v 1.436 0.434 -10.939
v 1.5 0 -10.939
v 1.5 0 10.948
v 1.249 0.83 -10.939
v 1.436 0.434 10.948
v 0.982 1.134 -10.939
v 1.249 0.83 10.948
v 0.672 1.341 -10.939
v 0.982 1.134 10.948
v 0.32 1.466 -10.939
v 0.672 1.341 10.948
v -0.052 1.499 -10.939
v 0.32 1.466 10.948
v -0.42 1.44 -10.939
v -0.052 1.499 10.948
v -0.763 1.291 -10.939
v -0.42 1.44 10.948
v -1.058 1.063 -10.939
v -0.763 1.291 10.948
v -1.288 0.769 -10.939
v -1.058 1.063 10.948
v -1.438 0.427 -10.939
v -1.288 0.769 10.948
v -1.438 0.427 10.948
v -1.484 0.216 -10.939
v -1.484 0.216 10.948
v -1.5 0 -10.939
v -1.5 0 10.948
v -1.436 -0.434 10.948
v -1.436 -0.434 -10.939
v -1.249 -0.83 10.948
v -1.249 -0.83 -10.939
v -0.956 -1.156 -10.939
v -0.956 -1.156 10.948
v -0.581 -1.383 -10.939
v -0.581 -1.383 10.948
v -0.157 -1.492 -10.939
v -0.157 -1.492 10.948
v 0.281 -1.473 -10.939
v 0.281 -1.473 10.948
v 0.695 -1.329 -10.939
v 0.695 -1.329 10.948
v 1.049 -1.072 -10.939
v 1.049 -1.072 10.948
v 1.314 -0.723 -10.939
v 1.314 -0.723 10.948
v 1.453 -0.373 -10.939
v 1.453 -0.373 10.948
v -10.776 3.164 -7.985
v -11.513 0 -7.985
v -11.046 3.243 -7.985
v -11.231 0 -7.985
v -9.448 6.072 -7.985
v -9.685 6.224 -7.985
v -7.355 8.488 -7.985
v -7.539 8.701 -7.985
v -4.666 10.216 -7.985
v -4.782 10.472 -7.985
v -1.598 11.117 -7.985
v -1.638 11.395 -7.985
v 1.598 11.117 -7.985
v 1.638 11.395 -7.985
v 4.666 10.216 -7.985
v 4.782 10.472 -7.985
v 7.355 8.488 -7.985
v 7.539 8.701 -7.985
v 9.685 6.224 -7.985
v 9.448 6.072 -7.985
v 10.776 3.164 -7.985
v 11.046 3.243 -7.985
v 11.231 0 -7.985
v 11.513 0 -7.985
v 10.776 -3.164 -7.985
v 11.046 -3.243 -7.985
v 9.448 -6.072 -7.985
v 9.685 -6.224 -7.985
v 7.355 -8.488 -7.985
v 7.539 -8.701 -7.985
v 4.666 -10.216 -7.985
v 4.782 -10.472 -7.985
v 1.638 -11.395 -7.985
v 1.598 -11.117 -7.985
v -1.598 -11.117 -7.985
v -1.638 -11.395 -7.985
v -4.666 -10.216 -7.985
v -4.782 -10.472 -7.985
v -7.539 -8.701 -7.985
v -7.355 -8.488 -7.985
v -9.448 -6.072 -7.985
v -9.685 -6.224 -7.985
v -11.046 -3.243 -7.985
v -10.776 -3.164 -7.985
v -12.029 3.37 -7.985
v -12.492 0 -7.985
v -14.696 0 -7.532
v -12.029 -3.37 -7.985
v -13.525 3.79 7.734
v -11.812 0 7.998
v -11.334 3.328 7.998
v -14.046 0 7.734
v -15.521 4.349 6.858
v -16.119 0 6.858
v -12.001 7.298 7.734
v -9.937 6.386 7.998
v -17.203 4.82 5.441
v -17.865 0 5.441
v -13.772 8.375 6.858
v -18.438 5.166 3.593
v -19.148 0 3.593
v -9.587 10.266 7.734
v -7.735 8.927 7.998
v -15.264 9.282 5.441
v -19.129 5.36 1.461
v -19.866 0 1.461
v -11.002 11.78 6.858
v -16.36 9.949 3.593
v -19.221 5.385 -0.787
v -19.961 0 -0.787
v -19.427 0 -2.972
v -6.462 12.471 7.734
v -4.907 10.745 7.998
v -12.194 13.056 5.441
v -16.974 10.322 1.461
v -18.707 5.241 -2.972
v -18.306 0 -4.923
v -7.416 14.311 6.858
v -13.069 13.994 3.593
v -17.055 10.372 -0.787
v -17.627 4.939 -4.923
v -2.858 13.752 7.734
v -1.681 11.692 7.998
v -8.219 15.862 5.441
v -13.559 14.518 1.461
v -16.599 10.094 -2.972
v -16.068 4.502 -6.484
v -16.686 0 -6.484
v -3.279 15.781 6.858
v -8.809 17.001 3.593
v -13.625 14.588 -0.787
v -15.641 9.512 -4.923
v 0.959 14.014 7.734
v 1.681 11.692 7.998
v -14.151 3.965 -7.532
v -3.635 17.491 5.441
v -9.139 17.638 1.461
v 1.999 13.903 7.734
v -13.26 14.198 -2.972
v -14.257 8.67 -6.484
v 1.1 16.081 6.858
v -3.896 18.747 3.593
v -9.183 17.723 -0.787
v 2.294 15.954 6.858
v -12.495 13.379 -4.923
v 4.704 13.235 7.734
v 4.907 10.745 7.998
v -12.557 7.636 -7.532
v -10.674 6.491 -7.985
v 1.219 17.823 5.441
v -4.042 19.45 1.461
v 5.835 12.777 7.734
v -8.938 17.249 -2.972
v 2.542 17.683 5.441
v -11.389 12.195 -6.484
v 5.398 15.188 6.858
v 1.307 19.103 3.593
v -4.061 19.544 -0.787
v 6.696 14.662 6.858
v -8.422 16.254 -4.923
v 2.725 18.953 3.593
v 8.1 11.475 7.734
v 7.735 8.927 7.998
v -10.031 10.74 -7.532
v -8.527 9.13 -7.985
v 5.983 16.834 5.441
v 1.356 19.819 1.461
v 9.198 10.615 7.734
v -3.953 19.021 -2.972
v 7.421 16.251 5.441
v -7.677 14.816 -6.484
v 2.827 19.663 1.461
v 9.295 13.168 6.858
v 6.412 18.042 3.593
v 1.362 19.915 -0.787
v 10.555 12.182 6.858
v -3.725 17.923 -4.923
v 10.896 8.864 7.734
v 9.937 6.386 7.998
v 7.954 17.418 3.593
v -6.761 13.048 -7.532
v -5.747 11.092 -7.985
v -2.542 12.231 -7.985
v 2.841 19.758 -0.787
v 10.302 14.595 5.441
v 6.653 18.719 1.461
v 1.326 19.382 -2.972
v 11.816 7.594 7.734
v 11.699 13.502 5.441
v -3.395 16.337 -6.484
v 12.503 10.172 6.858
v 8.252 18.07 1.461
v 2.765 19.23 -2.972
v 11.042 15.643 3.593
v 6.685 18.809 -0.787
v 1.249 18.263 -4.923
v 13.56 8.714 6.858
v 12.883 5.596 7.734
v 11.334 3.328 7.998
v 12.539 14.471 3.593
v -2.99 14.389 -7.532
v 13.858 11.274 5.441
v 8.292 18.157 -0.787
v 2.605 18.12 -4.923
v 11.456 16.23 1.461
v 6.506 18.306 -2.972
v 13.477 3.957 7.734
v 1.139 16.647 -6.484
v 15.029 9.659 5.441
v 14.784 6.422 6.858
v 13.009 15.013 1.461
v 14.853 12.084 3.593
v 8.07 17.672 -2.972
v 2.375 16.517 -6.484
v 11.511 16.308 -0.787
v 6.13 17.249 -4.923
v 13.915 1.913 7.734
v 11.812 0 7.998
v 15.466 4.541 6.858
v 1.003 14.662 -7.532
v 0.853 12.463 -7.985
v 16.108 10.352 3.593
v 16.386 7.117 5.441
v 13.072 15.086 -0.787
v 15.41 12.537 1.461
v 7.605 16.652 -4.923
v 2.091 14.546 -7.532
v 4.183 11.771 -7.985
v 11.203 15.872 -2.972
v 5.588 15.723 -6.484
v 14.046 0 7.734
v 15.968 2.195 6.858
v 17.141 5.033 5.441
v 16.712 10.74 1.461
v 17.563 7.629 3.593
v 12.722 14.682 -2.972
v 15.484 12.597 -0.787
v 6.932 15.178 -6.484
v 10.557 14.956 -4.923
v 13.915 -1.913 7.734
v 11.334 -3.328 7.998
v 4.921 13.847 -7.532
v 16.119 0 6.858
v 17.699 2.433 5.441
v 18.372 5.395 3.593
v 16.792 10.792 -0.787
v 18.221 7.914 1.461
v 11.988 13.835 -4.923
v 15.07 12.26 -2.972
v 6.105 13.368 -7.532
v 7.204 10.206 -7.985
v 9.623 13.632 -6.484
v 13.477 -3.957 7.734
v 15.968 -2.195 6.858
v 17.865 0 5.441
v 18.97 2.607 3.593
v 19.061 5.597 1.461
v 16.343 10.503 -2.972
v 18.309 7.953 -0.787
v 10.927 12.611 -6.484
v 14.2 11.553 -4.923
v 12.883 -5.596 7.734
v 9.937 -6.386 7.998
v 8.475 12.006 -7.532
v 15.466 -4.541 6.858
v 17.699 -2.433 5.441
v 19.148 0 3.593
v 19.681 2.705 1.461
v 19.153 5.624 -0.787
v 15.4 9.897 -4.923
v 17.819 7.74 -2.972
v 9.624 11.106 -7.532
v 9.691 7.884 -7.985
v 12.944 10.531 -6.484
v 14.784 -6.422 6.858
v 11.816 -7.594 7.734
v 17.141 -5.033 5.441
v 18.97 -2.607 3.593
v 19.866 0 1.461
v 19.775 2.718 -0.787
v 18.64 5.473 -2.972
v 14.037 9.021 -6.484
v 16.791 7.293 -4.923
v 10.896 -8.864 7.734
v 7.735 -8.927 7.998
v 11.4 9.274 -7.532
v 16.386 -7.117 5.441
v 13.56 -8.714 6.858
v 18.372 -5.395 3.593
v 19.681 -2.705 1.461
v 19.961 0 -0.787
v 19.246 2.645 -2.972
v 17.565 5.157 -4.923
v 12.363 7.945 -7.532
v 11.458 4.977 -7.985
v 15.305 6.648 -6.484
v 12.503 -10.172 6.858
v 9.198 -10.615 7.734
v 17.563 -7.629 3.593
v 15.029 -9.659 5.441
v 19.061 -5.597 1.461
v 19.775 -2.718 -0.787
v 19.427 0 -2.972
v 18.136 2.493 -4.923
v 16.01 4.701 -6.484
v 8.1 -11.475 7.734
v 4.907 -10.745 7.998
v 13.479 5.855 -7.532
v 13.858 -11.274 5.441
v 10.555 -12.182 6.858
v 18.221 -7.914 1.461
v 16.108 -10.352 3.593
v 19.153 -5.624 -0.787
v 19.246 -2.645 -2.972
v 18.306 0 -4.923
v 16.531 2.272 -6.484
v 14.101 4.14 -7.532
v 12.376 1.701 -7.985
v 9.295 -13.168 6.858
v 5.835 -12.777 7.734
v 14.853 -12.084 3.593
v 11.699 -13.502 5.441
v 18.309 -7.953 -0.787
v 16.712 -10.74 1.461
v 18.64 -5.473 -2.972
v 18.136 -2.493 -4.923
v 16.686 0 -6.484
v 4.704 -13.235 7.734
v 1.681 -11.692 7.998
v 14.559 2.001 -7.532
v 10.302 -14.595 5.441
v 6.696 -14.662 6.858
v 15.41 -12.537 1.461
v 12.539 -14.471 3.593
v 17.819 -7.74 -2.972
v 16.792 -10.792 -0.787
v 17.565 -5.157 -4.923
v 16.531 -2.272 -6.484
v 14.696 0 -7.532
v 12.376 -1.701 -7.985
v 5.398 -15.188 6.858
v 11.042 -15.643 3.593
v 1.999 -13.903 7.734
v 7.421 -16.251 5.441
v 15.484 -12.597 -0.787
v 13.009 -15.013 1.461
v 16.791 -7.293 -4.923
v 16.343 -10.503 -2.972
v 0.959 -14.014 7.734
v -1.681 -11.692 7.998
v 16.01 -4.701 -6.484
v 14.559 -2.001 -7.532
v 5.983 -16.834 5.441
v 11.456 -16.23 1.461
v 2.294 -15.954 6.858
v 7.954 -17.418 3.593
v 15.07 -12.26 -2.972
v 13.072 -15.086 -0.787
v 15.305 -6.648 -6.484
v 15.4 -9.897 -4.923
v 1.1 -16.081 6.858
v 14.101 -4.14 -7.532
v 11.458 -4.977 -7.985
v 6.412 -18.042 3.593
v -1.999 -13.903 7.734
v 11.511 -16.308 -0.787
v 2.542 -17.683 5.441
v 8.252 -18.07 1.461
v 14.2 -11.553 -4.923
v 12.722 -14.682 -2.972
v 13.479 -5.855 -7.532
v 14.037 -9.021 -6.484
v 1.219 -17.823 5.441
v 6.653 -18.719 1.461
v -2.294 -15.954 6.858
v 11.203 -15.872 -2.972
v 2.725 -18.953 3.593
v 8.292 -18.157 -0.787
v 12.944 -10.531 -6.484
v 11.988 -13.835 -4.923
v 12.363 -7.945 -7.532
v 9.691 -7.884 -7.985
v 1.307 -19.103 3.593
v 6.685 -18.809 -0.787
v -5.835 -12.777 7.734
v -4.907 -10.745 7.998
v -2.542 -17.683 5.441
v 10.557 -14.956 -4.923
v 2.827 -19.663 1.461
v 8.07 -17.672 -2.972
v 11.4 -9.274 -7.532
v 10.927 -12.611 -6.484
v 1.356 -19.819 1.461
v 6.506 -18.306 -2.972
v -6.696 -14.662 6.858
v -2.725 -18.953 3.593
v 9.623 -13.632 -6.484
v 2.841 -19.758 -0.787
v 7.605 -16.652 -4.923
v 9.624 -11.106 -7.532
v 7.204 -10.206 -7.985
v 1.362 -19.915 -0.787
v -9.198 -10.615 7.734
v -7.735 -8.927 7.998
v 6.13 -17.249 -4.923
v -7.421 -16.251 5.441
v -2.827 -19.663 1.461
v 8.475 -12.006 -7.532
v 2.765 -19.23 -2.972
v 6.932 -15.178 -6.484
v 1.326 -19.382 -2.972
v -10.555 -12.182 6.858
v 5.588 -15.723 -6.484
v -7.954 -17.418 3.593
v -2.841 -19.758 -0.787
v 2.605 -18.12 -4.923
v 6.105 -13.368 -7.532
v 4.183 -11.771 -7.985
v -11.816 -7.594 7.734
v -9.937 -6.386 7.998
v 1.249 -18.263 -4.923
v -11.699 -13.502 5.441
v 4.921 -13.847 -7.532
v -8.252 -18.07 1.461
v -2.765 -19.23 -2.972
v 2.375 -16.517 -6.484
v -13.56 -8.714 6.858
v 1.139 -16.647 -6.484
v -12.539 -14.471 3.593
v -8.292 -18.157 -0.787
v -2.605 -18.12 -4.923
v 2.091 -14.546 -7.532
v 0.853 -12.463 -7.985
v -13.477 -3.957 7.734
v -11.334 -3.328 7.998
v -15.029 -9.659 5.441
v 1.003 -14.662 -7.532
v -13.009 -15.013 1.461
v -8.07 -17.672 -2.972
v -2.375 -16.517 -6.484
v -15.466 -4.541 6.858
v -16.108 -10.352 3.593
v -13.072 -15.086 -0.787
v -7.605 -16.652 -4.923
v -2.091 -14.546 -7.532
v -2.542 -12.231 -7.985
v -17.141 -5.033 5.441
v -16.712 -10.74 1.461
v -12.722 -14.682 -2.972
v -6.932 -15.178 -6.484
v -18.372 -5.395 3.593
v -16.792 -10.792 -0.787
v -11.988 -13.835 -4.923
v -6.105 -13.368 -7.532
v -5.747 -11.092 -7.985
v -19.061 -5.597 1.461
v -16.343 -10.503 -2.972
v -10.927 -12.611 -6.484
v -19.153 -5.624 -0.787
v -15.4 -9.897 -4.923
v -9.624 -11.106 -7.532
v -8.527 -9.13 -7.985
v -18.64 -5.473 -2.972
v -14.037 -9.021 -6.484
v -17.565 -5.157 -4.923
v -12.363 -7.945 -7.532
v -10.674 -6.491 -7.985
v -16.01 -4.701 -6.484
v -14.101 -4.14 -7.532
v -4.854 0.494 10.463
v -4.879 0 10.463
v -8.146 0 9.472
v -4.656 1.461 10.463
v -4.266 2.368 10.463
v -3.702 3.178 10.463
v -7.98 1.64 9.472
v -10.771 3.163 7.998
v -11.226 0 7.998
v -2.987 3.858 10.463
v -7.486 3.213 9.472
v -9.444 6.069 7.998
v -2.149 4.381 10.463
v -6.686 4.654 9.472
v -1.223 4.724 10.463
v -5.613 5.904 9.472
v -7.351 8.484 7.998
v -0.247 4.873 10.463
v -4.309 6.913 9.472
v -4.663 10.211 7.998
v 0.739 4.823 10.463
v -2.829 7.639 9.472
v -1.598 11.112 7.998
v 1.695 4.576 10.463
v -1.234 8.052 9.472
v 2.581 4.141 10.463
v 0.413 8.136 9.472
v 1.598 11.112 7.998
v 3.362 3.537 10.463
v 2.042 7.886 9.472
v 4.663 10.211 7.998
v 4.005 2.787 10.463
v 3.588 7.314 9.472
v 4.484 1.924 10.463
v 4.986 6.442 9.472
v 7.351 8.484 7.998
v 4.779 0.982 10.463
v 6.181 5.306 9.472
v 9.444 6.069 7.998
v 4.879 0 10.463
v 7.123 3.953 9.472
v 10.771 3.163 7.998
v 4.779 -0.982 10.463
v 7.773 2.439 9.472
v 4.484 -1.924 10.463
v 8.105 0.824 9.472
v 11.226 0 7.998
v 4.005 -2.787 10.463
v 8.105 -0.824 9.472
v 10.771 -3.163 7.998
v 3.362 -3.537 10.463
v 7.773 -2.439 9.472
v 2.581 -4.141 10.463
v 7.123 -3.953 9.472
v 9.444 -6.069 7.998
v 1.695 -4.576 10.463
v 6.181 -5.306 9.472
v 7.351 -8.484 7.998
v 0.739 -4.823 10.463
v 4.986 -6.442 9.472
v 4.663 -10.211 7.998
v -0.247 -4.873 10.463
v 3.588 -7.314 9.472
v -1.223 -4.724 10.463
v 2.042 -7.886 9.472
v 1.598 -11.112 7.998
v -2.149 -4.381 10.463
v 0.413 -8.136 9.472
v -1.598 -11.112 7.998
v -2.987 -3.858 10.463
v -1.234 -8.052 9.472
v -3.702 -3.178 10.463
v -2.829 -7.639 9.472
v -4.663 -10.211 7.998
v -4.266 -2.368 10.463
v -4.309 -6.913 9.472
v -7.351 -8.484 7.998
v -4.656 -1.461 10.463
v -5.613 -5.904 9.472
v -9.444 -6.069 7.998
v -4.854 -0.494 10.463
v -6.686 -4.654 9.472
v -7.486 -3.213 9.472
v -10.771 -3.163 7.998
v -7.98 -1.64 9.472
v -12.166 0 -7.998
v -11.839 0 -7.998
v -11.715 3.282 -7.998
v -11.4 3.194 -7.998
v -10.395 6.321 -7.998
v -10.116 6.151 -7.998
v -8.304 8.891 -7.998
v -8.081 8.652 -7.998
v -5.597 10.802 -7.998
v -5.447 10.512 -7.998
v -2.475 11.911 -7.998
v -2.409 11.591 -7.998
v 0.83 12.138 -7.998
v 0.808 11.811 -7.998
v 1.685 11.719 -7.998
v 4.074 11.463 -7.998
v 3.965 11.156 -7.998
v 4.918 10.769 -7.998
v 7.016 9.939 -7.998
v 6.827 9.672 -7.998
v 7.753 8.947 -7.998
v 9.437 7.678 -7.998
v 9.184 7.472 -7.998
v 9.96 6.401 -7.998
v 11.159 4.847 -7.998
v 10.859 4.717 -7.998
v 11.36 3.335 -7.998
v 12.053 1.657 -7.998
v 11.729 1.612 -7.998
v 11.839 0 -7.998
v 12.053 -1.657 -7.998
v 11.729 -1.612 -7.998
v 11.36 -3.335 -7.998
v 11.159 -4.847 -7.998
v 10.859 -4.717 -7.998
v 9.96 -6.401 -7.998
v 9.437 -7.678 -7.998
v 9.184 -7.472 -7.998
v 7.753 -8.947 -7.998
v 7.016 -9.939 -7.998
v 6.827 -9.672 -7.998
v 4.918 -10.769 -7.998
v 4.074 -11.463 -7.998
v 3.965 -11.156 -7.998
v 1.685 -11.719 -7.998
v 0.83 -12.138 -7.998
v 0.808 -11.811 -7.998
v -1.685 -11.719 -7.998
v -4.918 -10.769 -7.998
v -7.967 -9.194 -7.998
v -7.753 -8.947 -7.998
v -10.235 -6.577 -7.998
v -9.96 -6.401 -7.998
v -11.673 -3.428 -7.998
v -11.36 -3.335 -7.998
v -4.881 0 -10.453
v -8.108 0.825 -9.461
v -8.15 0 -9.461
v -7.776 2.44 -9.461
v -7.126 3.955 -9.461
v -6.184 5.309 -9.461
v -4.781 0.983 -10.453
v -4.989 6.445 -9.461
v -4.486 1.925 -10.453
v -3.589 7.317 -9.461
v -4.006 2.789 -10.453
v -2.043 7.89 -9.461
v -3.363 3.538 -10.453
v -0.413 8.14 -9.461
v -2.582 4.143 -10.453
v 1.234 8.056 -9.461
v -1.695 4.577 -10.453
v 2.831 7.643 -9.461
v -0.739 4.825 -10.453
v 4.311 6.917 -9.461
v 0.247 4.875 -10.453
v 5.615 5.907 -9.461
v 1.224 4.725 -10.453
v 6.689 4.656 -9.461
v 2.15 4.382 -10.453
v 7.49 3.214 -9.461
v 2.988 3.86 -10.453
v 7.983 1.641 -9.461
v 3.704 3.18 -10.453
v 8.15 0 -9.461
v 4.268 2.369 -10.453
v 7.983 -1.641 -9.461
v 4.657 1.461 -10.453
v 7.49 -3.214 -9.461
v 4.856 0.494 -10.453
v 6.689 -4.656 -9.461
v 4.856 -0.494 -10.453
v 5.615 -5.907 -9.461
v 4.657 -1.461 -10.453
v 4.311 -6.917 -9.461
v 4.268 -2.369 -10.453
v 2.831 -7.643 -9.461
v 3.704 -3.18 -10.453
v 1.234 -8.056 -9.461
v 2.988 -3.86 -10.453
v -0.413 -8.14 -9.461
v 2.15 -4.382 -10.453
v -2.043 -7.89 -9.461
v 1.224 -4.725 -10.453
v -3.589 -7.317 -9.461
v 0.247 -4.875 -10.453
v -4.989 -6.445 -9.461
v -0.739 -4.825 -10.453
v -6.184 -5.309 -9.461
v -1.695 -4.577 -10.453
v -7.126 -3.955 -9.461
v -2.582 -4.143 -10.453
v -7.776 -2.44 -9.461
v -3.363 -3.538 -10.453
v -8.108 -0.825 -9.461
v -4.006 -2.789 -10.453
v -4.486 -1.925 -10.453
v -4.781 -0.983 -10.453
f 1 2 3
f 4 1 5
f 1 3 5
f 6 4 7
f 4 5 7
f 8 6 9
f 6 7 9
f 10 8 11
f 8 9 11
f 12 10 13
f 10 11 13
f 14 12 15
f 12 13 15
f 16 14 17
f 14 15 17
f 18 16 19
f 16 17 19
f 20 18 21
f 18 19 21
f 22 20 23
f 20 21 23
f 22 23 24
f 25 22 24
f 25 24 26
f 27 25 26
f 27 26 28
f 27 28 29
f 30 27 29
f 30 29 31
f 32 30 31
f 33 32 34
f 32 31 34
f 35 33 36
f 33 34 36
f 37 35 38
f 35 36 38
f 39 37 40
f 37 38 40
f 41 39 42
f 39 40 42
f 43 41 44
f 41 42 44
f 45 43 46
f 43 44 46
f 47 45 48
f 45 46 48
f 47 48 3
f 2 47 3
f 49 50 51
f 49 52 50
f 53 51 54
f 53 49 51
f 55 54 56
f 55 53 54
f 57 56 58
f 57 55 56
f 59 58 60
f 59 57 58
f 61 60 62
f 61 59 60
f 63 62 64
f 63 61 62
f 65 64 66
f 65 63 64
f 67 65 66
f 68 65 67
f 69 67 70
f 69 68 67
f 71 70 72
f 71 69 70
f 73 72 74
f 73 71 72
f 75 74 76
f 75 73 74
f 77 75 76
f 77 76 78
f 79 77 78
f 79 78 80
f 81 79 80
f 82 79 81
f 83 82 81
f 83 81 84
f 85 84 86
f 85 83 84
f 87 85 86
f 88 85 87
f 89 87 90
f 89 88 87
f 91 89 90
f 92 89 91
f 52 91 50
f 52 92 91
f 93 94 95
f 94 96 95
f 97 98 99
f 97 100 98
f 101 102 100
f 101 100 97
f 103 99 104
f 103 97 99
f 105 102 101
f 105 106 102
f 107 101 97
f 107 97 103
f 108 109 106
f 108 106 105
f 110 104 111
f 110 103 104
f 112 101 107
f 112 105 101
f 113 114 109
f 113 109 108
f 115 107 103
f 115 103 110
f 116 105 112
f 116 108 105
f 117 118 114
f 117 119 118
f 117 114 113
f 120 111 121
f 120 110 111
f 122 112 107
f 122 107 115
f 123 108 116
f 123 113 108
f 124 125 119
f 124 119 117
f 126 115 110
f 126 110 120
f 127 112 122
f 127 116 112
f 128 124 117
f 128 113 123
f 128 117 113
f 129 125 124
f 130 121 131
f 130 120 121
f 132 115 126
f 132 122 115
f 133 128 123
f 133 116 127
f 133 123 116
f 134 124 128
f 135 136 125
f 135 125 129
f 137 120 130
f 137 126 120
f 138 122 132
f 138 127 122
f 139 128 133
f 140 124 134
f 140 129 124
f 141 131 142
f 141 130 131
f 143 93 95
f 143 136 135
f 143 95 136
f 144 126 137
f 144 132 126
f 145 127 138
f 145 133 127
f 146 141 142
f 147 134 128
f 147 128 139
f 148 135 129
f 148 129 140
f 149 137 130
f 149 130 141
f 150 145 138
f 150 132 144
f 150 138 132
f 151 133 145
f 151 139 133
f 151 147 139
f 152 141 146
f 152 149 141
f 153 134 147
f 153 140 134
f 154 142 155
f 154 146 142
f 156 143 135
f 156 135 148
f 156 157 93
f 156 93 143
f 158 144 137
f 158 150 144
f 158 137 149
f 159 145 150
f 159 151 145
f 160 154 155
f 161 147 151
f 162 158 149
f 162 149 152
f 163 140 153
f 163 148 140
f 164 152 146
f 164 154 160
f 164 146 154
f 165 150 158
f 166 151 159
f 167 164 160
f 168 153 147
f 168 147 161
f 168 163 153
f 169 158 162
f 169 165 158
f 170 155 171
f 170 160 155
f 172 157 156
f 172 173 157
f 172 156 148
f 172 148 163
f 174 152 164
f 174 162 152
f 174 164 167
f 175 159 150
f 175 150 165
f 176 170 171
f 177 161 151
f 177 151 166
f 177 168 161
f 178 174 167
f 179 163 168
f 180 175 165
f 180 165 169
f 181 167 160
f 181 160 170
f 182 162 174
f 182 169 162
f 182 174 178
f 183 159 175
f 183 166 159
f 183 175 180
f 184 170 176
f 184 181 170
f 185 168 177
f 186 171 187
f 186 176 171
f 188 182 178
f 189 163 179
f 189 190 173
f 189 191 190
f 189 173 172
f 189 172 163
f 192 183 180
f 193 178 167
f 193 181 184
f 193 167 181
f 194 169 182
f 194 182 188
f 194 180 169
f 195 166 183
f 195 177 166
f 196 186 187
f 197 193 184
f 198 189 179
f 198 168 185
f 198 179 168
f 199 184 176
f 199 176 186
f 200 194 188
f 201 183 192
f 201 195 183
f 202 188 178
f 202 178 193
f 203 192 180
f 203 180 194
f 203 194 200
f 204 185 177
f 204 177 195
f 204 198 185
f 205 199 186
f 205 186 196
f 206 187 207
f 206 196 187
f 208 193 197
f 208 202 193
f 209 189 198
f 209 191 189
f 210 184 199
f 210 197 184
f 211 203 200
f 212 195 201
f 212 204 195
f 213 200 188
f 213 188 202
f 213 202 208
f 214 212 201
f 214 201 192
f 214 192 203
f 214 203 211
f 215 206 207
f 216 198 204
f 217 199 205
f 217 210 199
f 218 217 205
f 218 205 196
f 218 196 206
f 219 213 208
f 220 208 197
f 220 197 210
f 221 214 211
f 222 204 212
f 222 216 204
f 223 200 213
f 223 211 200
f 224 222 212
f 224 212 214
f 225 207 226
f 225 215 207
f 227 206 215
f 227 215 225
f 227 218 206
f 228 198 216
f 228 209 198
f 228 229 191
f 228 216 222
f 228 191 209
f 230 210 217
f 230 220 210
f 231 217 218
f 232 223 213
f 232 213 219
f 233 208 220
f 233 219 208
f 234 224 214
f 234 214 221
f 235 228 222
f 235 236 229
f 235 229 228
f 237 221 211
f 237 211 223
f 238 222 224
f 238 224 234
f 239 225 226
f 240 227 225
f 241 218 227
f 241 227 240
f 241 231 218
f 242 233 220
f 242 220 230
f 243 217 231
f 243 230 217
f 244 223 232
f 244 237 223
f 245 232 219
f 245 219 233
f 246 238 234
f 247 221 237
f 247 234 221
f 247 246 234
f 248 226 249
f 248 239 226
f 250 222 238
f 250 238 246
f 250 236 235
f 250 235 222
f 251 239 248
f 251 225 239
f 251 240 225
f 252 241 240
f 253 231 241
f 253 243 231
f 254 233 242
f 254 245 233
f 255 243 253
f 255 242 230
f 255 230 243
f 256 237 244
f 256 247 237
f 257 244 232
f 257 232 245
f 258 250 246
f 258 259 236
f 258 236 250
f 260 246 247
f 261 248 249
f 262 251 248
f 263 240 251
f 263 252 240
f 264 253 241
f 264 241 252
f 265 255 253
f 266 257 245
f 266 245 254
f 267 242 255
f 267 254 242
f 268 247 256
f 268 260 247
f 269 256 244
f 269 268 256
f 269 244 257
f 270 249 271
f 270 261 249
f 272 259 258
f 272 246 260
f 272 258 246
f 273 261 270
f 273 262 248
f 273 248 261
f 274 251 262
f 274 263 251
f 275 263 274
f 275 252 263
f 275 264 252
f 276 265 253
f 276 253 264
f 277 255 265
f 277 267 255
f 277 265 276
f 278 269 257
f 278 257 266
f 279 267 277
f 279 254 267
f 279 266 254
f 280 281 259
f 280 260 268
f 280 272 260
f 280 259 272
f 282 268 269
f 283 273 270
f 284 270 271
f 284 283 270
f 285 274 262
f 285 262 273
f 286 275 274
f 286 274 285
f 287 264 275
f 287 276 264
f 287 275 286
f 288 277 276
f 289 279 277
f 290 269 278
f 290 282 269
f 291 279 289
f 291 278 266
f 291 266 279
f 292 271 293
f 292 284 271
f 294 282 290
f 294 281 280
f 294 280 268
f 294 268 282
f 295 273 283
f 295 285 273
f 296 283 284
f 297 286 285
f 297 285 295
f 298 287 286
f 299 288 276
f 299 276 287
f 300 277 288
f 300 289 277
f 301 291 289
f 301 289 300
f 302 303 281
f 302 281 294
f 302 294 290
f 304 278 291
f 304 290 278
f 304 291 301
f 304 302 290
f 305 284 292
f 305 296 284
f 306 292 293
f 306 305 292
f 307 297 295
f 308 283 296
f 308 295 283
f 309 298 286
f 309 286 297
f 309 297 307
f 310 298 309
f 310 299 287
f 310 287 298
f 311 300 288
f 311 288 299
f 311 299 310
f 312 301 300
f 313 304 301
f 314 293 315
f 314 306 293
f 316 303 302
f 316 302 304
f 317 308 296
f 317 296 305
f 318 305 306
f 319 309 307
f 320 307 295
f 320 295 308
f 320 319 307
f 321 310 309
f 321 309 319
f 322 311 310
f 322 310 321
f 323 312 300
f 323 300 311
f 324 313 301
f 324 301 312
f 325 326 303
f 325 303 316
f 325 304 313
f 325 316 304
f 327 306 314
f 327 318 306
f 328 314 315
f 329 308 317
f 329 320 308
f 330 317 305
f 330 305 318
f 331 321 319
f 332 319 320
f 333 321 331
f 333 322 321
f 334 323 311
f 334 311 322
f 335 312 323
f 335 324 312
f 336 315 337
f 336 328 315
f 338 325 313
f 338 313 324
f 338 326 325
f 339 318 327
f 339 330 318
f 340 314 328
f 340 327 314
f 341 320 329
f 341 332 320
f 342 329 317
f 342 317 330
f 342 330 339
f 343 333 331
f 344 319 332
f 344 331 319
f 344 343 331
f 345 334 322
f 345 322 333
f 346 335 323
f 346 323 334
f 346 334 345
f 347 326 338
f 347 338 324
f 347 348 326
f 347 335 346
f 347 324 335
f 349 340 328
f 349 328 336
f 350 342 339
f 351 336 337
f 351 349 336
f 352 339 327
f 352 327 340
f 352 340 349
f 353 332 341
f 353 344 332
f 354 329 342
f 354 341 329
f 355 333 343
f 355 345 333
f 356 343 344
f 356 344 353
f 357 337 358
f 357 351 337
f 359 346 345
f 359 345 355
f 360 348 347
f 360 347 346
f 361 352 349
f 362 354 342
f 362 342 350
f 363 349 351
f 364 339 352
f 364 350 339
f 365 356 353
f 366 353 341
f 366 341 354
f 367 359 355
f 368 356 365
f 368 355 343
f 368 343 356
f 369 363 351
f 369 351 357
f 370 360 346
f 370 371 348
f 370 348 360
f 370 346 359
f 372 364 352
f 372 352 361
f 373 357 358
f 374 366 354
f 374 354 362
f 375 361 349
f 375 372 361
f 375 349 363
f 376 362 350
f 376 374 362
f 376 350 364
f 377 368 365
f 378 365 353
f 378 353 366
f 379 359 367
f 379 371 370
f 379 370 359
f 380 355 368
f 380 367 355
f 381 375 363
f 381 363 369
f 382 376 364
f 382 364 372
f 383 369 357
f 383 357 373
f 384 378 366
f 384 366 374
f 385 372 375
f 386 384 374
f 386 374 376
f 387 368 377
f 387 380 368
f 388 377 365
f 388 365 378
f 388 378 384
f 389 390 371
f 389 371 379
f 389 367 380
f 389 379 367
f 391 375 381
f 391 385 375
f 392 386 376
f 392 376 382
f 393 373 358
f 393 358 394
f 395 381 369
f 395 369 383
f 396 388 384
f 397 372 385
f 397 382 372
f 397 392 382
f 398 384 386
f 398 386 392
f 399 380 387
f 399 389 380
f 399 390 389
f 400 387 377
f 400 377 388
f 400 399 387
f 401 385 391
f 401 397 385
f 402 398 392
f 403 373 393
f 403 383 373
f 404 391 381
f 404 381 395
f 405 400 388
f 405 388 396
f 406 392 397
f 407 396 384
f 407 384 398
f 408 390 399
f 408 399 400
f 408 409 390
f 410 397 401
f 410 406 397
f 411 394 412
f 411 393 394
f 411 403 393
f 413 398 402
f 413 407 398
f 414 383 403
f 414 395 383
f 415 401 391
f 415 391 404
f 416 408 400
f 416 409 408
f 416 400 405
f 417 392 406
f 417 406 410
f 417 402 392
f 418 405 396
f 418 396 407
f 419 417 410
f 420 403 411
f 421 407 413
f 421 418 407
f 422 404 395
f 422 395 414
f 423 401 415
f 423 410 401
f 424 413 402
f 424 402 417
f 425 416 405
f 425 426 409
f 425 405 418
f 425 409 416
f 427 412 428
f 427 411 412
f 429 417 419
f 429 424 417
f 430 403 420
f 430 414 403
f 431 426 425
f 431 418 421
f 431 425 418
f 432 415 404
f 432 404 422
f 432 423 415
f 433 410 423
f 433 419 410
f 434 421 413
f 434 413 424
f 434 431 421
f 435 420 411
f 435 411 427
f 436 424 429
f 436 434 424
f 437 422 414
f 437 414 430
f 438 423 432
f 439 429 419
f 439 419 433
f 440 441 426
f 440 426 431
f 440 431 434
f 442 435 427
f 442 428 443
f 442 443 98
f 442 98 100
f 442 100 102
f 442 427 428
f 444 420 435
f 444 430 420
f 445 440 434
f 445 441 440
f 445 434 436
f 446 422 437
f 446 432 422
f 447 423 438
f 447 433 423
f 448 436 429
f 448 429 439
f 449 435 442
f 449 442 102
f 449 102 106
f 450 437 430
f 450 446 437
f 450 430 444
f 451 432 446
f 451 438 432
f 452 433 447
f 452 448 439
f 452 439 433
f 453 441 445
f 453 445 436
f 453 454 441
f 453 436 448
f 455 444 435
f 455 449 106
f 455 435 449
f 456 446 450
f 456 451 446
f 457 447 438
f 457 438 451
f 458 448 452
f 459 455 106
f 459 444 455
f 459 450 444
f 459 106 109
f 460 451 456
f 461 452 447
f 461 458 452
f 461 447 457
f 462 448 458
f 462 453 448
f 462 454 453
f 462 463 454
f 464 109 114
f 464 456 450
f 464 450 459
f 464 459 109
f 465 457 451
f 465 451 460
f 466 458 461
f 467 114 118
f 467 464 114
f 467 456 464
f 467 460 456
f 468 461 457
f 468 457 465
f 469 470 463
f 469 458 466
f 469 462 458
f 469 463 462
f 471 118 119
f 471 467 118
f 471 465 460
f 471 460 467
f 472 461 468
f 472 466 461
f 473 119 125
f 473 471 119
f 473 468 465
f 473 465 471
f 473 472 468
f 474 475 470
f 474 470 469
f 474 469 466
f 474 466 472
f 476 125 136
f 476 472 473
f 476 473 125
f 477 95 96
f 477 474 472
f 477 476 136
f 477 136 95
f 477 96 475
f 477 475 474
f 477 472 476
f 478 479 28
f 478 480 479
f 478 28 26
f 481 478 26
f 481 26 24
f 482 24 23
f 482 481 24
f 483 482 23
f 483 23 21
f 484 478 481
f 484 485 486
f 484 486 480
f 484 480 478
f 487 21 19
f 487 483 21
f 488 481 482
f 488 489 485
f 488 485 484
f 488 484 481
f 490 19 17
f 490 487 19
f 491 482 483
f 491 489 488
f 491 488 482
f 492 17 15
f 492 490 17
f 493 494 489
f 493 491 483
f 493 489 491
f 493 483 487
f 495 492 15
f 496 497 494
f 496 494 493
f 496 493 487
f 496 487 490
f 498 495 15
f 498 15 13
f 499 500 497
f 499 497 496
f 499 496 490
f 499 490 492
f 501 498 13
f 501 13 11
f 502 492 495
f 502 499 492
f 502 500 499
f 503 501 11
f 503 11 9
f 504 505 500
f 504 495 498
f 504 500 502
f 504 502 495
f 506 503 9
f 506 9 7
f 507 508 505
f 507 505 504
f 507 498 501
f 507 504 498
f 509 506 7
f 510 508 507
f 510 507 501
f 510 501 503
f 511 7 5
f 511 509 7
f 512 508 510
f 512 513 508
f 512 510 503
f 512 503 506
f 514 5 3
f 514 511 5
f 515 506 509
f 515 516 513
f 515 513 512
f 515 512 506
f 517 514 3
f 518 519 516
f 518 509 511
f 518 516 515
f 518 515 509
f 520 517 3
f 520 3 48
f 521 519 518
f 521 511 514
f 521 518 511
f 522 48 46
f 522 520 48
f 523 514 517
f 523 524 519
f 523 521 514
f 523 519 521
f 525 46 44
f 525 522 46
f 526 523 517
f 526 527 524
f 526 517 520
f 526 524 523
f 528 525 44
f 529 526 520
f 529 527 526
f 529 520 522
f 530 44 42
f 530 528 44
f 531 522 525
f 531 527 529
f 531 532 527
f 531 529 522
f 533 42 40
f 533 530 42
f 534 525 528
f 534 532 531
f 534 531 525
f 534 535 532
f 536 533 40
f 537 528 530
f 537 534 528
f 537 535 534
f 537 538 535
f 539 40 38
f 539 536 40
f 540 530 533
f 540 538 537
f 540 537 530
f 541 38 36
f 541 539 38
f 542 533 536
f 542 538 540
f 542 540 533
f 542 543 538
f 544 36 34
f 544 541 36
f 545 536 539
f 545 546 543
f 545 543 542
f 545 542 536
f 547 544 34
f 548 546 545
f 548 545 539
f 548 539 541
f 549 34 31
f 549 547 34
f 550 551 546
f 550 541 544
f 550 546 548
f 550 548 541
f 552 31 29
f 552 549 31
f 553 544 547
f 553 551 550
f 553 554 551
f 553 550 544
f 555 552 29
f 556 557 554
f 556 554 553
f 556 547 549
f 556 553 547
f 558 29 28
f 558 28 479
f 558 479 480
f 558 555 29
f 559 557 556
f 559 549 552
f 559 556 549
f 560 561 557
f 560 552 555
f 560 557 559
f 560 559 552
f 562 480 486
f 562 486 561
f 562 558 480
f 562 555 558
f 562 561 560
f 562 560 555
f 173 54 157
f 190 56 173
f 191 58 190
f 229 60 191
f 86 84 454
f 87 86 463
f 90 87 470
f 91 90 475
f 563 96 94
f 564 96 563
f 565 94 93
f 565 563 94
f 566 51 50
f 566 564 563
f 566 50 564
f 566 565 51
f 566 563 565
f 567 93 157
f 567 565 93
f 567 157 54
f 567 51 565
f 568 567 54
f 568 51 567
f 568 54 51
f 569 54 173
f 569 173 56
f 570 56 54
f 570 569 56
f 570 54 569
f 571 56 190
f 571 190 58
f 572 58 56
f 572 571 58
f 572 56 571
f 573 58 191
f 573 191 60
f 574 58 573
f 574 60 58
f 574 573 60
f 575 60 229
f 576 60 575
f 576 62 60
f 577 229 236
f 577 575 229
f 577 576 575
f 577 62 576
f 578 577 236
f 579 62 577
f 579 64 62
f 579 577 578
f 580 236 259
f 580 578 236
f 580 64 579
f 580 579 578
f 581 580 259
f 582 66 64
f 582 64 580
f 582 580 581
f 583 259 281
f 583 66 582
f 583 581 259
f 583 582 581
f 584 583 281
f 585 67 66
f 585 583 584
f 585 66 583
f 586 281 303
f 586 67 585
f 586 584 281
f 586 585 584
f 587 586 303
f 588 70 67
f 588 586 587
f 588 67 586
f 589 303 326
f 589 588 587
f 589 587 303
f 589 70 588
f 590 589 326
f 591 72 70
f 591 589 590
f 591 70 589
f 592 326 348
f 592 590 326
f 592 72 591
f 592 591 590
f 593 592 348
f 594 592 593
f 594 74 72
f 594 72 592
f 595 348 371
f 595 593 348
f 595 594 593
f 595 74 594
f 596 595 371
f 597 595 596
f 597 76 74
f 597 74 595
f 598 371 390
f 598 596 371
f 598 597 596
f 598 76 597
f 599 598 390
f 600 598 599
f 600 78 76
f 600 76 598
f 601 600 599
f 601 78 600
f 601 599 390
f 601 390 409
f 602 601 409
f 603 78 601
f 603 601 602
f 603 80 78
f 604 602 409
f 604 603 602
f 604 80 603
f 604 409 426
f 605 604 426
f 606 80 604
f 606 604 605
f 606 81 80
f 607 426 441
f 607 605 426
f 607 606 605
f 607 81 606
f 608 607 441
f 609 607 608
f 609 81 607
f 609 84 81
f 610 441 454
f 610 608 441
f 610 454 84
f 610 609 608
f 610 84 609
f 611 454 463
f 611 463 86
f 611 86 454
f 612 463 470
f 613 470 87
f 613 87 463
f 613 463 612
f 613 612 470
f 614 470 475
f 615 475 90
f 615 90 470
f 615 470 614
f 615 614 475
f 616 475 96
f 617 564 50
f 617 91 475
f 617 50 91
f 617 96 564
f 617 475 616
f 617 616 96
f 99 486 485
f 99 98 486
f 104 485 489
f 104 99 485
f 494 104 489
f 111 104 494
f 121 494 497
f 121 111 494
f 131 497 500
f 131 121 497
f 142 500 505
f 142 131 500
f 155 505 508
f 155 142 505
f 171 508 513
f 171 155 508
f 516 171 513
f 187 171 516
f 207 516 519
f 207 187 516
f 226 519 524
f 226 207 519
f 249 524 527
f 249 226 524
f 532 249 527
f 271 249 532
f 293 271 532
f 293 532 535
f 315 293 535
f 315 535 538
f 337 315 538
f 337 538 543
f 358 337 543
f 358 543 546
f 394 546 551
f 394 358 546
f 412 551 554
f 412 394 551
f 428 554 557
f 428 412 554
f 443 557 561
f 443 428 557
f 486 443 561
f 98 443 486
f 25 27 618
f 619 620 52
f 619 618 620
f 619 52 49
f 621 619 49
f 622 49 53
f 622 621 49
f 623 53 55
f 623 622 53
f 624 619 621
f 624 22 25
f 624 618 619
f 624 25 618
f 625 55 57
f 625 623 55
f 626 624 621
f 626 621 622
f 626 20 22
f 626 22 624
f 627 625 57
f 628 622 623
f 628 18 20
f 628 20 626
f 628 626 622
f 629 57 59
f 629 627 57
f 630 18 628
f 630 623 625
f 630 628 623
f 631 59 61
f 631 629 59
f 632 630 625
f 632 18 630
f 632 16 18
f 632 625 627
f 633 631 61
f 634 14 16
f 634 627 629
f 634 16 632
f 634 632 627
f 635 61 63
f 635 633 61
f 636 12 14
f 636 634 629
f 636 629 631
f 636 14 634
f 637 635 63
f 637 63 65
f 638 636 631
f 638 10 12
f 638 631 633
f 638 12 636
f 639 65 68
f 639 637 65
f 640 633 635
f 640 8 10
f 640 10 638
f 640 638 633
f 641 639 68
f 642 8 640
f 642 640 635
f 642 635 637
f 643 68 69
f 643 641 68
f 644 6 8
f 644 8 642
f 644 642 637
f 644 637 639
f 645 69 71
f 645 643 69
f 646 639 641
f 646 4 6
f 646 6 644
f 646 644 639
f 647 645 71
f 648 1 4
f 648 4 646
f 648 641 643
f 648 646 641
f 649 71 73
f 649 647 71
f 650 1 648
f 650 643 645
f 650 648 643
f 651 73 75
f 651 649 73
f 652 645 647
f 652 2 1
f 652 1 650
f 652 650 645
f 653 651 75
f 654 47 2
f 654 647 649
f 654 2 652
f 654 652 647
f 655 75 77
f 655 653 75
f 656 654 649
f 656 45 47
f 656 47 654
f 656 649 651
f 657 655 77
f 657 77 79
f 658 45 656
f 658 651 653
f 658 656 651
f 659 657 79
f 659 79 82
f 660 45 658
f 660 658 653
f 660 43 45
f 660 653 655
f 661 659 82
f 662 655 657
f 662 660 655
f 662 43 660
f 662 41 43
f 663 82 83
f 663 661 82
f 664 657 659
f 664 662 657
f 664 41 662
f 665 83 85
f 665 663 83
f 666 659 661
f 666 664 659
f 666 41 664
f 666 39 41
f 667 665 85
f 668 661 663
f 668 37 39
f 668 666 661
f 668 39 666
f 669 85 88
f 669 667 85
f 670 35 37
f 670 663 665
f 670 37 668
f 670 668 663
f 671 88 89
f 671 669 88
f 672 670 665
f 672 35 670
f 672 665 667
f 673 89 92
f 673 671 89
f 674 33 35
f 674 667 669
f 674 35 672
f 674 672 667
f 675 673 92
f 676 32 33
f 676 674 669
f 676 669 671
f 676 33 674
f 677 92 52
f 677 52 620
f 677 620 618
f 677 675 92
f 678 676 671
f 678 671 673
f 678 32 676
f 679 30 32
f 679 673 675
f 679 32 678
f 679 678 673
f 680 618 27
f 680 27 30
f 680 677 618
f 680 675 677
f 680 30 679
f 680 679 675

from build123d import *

# Parameters (mm, degrees)
F2_R          = 1.5
F3_DEPTH      = 10.9897371298
F3_DEPTH_BACK = 10.99934016


with BuildPart() as f1:
    # F0 (on Front) → F1 (revolve)
    with BuildSketch(Plane.XZ):
        with BuildLine():
            Line((-11.5125622961, -7.9851364725), (-11.2310720272, -7.9852245345))
            ThreePointArc((-11.2310720272, -7.9852245345), (-5.8128750802, -10.2248932597), (0, -10.9887371298))
            Line((0, -10.9887371298), (0, 10.99834016))
            ThreePointArc((0, 10.99834016), (-5.8099761259, 10.2352713467), (-11.2258712218, 7.997822597))
            Line((-11.2258712218, 7.997822597), (-11.8122072176, 7.9977955632))
            ThreePointArc((-11.8122072176, 7.9977955632), (-19.9927642859, 0.3401750584), (-12.4924337781, -7.9848299277))
            Line((-12.4924337781, -7.9848299277), (-11.5125622961, -7.9851364725))
        make_face()
        with BuildLine():
            ThreePointArc((-12.4924337781, -7.9848299277), (-12.0025027349, -7.9999996085), (-11.5125622961, -7.9851364725))
            Line((-11.5125622961, -7.9851364725), (-12.4924337781, -7.9848299277))
        make_face()
    revolve(axis=Axis((0, 0, 0.0048015151), (0, 0, -1)))

    # F2 (on Top) → F3 (cut, two sides)
    with BuildSketch(Plane.XY) as f3_sk:
        Circle(F2_R)
    extrude(amount=-F3_DEPTH, mode=Mode.SUBTRACT)
    extrude(f3_sk.sketch, amount=F3_DEPTH_BACK, mode=Mode.SUBTRACT)


solid = f1.part
